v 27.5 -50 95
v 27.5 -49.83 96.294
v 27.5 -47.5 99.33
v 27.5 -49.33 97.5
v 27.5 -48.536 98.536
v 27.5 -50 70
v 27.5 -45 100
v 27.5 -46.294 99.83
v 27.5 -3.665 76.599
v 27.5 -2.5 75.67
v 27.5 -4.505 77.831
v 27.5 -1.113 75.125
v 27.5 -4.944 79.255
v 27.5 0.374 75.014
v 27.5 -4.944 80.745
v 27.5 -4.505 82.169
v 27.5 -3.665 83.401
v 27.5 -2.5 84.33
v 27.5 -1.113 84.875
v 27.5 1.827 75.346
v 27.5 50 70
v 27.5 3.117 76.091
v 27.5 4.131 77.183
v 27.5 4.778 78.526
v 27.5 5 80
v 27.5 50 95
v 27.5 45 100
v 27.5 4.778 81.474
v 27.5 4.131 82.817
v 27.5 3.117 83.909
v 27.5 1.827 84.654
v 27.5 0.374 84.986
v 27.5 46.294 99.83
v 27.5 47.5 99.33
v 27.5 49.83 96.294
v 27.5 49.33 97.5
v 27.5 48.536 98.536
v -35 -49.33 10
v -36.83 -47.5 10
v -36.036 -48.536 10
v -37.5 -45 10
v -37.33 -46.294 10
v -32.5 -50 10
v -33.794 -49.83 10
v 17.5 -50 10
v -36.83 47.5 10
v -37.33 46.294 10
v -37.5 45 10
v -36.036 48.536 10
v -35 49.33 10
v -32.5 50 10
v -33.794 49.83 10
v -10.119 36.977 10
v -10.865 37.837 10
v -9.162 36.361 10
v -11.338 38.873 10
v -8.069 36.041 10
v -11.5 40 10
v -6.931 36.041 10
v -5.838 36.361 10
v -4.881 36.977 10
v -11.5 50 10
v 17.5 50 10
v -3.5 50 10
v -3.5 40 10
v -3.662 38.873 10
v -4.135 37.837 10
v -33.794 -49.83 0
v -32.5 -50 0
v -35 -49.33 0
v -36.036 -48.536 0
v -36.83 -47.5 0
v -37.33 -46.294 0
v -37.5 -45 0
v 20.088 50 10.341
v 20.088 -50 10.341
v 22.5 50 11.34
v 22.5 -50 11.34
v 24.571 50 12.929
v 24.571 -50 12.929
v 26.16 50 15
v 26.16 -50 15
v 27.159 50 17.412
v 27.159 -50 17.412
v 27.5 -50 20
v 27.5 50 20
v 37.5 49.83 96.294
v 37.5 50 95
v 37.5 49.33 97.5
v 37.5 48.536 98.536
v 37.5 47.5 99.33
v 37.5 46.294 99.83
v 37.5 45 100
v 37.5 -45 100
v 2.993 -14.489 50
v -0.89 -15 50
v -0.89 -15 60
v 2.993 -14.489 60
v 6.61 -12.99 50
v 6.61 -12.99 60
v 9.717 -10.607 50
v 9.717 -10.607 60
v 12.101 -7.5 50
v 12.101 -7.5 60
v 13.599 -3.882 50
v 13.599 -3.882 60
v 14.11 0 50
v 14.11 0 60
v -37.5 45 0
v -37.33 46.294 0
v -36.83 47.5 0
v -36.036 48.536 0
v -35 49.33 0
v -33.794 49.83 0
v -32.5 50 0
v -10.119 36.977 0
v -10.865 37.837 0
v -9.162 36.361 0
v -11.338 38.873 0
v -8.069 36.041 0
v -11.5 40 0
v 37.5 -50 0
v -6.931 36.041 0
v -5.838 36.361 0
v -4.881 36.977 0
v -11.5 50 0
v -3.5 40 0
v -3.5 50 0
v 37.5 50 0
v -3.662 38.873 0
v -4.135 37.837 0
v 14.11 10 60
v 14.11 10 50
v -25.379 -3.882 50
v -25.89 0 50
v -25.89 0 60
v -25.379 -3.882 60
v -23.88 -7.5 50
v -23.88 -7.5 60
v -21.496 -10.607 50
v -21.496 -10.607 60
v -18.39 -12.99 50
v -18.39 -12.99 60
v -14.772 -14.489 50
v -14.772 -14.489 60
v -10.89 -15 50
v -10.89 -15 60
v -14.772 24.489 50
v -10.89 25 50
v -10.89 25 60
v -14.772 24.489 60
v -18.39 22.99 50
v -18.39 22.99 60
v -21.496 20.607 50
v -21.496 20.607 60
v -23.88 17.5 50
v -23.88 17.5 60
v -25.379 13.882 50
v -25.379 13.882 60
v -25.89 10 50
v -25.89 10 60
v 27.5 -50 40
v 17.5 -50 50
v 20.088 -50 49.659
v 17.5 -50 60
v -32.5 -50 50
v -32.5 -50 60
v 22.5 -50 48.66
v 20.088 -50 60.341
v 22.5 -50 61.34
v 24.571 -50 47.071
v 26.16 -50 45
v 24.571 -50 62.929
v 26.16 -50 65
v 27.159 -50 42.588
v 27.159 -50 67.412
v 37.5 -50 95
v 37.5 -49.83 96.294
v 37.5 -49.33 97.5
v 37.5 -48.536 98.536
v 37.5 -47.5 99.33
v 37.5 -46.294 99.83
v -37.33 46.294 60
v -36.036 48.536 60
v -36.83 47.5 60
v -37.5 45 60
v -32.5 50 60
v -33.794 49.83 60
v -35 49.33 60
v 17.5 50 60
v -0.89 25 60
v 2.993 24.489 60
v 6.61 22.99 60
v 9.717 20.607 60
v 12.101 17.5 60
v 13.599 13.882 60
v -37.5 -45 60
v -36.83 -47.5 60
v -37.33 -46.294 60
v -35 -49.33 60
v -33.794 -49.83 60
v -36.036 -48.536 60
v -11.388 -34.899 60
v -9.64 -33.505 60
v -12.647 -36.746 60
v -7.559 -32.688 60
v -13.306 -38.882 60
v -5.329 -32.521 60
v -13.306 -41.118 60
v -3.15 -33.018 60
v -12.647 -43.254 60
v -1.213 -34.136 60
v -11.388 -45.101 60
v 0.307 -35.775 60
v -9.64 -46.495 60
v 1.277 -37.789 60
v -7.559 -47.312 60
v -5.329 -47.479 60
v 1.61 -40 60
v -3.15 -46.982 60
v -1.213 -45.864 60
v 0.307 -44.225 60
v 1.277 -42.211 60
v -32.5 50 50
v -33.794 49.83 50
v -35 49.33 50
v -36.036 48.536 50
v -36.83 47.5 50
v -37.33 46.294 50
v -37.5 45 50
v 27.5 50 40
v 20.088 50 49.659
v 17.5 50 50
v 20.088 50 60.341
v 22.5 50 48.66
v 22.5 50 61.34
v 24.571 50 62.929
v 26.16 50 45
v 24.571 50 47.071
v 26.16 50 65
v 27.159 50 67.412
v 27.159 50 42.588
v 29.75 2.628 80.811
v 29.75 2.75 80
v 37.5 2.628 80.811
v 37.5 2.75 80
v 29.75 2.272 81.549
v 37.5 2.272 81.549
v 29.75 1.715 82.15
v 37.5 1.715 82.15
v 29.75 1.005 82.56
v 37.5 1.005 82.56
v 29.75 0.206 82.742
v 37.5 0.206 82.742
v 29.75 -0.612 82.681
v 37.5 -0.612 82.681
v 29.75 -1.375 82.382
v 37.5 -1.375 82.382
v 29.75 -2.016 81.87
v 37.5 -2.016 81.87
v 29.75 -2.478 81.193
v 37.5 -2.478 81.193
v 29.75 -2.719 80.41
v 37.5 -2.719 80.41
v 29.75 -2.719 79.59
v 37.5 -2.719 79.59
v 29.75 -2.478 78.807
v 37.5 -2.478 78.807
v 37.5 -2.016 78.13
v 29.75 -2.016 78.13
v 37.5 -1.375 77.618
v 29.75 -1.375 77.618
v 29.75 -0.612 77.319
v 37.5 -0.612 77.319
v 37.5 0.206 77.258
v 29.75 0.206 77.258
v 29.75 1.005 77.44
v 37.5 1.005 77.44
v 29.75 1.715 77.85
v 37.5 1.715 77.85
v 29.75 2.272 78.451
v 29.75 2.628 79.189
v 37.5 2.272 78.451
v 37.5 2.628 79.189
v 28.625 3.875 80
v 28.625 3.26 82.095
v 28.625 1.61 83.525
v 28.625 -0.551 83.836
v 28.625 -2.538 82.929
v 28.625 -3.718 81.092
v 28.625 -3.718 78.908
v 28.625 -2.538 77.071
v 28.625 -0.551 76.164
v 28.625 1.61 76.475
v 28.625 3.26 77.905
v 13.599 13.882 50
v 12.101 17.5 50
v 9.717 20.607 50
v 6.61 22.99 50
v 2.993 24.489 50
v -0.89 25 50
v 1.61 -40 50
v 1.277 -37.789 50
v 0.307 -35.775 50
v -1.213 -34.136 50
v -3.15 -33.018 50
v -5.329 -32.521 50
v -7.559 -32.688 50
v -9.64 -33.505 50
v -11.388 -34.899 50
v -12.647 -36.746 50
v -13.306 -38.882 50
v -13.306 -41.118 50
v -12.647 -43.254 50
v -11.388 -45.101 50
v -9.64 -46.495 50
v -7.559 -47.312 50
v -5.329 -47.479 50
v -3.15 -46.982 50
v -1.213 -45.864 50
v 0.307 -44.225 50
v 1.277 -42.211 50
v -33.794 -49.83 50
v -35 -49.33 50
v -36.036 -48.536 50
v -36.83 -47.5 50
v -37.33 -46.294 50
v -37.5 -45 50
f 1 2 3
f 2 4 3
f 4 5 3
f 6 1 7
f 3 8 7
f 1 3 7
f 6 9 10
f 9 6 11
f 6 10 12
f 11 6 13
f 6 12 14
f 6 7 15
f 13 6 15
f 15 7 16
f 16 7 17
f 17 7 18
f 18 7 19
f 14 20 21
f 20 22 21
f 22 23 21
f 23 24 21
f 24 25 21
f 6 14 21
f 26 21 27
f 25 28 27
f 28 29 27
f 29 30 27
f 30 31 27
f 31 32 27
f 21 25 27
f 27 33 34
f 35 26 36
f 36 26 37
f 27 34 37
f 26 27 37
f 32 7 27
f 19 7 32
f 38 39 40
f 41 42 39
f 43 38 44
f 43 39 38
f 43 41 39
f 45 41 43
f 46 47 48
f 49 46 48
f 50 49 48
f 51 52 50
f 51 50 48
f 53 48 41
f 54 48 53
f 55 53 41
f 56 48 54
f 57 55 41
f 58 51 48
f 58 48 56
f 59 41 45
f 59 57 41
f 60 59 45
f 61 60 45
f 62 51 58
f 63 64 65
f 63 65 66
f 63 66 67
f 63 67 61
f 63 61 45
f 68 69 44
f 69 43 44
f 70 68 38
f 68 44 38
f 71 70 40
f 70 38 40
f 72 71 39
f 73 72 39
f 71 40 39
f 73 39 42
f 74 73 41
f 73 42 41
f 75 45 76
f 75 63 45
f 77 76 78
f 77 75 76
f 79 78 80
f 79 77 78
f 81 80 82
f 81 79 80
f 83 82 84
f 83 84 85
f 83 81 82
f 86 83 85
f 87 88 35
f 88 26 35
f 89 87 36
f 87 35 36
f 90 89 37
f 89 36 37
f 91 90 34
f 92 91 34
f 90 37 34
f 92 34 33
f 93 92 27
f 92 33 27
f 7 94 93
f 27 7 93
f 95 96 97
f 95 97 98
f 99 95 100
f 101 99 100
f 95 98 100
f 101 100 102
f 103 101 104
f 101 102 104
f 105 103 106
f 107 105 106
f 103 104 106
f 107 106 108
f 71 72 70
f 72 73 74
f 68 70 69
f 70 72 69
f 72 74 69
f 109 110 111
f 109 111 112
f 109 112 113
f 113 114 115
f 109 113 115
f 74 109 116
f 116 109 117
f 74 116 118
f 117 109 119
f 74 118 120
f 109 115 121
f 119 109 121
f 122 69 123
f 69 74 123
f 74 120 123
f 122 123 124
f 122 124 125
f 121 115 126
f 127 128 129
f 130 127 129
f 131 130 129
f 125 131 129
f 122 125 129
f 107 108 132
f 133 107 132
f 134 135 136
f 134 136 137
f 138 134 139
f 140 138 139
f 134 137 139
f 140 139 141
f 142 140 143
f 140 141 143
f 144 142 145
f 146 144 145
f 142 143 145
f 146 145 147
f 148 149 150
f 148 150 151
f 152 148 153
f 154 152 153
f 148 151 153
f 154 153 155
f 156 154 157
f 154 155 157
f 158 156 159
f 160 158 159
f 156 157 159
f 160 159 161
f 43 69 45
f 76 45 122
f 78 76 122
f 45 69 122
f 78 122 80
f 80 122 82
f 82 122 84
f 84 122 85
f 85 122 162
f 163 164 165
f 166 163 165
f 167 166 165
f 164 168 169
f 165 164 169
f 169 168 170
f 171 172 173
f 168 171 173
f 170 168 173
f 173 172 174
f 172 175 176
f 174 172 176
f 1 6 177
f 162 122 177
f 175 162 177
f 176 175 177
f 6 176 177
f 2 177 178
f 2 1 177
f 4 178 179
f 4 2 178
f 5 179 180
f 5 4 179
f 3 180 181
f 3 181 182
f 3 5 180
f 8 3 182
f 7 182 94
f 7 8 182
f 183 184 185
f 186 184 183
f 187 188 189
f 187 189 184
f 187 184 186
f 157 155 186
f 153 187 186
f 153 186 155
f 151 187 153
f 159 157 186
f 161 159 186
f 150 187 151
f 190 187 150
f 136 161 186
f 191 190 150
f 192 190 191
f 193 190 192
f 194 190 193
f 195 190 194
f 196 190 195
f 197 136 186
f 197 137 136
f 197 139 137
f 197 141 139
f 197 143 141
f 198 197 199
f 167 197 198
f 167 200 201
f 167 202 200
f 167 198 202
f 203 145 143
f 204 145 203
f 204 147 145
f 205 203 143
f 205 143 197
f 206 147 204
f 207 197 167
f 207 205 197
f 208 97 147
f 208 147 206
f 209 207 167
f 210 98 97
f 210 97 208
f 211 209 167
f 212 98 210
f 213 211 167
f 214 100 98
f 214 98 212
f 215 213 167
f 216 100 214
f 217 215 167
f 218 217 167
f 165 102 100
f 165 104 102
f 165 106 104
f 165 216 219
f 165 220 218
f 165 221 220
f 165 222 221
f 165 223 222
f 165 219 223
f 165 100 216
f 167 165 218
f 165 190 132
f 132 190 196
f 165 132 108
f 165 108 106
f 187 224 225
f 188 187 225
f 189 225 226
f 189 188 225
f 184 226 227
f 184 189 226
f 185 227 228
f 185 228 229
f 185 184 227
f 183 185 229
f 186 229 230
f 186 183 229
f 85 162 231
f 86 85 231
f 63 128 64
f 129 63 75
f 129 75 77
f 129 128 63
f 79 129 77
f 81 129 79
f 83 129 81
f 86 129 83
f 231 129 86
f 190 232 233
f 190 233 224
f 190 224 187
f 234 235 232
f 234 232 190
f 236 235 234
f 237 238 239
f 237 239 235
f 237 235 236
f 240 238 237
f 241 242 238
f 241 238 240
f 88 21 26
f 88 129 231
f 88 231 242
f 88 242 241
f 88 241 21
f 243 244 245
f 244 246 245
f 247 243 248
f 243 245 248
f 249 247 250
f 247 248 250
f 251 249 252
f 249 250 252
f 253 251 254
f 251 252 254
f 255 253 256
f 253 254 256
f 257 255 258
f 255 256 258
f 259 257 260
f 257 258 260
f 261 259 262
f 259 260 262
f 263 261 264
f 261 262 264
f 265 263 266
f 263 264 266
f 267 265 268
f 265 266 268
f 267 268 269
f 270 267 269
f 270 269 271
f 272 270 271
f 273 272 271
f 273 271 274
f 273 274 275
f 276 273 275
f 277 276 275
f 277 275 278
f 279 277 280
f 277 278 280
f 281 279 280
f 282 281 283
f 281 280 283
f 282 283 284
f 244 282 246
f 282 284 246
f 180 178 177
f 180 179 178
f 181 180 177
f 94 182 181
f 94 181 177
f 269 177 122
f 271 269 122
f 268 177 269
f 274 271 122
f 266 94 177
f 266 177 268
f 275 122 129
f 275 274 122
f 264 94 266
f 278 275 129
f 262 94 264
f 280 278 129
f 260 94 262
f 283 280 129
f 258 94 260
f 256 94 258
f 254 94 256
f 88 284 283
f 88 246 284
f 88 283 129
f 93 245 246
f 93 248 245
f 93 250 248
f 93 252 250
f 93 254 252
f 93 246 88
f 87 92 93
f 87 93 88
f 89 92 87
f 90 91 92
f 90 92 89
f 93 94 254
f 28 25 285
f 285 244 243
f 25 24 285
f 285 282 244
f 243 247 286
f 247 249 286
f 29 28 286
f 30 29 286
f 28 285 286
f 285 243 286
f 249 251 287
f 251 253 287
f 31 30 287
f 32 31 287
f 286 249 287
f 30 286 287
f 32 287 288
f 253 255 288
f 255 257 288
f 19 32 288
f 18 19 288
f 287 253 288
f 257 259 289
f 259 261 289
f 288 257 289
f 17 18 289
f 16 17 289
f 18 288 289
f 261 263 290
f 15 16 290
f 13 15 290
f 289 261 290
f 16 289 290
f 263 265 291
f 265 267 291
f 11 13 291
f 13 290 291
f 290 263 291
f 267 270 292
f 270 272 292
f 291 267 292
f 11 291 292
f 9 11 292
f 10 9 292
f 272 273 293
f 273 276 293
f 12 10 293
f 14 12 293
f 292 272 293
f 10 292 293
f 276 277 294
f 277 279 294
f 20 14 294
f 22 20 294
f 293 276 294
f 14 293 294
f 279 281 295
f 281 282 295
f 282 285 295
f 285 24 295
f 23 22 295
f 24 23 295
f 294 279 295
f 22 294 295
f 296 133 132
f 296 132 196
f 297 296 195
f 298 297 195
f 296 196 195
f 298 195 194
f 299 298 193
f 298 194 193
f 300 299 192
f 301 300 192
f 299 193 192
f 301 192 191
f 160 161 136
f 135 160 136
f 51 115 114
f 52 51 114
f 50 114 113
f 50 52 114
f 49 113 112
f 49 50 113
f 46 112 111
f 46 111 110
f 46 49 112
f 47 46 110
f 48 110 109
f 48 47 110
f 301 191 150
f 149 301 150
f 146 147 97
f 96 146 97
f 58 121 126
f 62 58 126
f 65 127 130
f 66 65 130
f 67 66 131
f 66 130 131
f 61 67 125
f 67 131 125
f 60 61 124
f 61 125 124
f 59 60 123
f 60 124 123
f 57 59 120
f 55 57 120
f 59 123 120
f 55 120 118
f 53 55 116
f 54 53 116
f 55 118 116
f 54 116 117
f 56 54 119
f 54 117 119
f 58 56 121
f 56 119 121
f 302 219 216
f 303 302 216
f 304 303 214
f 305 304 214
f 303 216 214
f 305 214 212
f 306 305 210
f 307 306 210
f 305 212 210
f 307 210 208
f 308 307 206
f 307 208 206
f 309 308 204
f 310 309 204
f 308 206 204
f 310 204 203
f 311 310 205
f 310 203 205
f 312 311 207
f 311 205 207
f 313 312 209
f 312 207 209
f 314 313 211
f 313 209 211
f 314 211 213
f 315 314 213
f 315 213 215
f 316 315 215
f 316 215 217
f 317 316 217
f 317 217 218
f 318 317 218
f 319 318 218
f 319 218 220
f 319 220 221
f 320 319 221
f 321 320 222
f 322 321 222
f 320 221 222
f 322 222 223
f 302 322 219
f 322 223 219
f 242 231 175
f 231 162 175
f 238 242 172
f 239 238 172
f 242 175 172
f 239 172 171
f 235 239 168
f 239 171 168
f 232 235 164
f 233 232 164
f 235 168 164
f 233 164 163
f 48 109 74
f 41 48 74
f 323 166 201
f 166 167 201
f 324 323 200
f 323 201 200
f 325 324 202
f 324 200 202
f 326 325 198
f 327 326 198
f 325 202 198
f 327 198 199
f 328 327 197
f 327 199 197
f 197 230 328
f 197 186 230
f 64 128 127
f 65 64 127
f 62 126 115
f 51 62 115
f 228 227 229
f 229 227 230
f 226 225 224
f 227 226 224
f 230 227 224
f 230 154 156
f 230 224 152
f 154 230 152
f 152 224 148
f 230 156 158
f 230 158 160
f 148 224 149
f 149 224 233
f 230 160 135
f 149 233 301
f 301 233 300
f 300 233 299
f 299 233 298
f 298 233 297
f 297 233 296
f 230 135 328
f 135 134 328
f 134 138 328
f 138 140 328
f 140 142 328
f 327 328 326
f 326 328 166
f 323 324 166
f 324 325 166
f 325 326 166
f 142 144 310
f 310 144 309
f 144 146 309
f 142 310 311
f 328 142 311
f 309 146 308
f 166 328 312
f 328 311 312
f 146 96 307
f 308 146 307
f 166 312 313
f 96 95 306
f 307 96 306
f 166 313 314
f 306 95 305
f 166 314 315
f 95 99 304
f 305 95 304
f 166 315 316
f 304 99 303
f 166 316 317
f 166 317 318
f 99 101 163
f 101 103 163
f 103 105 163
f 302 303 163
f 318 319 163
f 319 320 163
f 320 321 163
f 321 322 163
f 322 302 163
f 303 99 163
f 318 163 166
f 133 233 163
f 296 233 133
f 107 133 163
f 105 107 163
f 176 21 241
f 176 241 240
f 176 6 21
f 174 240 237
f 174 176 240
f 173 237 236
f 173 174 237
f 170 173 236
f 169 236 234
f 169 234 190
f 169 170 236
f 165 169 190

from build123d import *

# Parameters (mm, degrees)
F1_DEPTH       = 10
F2_W           = 100
F2_H           = 90
F3_DEPTH       = 10
F5_W           = 100
F5_H           = 10
F6_DEPTH       = 65
F7_D           = 5.5
F7_CSINK_D     = 10
F7_CSINK_ANGLE = 90
F8_R           = 5
F9_R           = 10
F10_R          = 7.5
F11_DEPTH      = 10


with BuildPart() as f1:
    # F0 (on Top) → F1 (new body)
    with BuildSketch(Plane.XY):
        with BuildLine():
            Line((-11.5, 50), (-37.5, 50))
            Line((-37.5, 50), (-37.5, -50))
            Line((-37.5, -50), (37.5, -50))
            Line((37.5, -50), (37.5, 50))
            Line((37.5, 50), (-3.5, 50))
            Line((-3.5, 50), (-3.5, 40))
            ThreePointArc((-3.5, 40), (-7.5, 36), (-11.5, 40))
            Line((-11.5, 40), (-11.5, 50))
        make_face()
    extrude(amount=F1_DEPTH)

    # F2 (on face) → F3 (join)
    with BuildSketch(Plane.YZ.offset(37.5)):
        with Locations((0, 55)):
            Rectangle(F2_W, F2_H)
    extrude(amount=-F3_DEPTH)

    # F5 (on face) → F6 (join, through all)
    with BuildSketch(Plane(origin=(27.5, 0, 0), x_dir=(0, -1, 0), z_dir=(-1, 0, 0))):
        with Locations((0, 55)):
            Rectangle(F5_W, F5_H)
    extrude(amount=F6_DEPTH)

    # F7 (through all)
    with Locations(Plane(origin=(27.5, 0, 0), x_dir=(0, -1, 0), z_dir=(-1, 0, 0))):
        with Locations((0, 80)):
            CounterSinkHole(F7_D / 2, F7_CSINK_D / 2, counter_sink_angle=F7_CSINK_ANGLE)

    # F8
    f8_edges = [f1.edges().sort_by_distance(p)[0] for p in [
        (-37.5, 50, 5),
        (-37.5, -50, 5),
        (32.5, -50, 100),
        (32.5, 50, 100),
        (-37.5, 50, 55),
        (-37.5, -50, 55),
    ]]
    fillet(f8_edges, radius=F8_R)

    # F9
    f9_edges = [f1.edges().sort_by_distance(p)[0] for p in [
        (27.5, 0, 10),
        (27.5, 0, 60),
        (27.5, 0, 50),
    ]]
    fillet(f9_edges, radius=F9_R)

    # F10 (on face) → F11 (cut, through all)
    with BuildSketch(Plane.XY.offset(60)):
        with Locations((-5.8896257542, -40)):
            Circle(F10_R)
        with BuildLine():
            Line((-0.8896257542, 25), (-10.8896257542, 25))
            ThreePointArc((-10.8896257542, 25), (-21.496227472, 20.6066017178), (-25.8896257542, 10))
            Line((-25.8896257542, 10), (-25.8896257542, 0))
            ThreePointArc((-25.8896257542, 0), (-21.496227472, -10.6066017178), (-10.8896257542, -15))
            Line((-10.8896257542, -15), (-0.8896257542, -15))
            ThreePointArc((-0.8896257542, -15), (9.7169759636, -10.6066017178), (14.1103742458, 0))
            Line((14.1103742458, 0), (14.1103742458, 10))
            ThreePointArc((14.1103742458, 10), (9.7169759636, 20.6066017178), (-0.8896257542, 25))
        make_face()
    extrude(amount=-F11_DEPTH, mode=Mode.SUBTRACT)


solid = f1.part
